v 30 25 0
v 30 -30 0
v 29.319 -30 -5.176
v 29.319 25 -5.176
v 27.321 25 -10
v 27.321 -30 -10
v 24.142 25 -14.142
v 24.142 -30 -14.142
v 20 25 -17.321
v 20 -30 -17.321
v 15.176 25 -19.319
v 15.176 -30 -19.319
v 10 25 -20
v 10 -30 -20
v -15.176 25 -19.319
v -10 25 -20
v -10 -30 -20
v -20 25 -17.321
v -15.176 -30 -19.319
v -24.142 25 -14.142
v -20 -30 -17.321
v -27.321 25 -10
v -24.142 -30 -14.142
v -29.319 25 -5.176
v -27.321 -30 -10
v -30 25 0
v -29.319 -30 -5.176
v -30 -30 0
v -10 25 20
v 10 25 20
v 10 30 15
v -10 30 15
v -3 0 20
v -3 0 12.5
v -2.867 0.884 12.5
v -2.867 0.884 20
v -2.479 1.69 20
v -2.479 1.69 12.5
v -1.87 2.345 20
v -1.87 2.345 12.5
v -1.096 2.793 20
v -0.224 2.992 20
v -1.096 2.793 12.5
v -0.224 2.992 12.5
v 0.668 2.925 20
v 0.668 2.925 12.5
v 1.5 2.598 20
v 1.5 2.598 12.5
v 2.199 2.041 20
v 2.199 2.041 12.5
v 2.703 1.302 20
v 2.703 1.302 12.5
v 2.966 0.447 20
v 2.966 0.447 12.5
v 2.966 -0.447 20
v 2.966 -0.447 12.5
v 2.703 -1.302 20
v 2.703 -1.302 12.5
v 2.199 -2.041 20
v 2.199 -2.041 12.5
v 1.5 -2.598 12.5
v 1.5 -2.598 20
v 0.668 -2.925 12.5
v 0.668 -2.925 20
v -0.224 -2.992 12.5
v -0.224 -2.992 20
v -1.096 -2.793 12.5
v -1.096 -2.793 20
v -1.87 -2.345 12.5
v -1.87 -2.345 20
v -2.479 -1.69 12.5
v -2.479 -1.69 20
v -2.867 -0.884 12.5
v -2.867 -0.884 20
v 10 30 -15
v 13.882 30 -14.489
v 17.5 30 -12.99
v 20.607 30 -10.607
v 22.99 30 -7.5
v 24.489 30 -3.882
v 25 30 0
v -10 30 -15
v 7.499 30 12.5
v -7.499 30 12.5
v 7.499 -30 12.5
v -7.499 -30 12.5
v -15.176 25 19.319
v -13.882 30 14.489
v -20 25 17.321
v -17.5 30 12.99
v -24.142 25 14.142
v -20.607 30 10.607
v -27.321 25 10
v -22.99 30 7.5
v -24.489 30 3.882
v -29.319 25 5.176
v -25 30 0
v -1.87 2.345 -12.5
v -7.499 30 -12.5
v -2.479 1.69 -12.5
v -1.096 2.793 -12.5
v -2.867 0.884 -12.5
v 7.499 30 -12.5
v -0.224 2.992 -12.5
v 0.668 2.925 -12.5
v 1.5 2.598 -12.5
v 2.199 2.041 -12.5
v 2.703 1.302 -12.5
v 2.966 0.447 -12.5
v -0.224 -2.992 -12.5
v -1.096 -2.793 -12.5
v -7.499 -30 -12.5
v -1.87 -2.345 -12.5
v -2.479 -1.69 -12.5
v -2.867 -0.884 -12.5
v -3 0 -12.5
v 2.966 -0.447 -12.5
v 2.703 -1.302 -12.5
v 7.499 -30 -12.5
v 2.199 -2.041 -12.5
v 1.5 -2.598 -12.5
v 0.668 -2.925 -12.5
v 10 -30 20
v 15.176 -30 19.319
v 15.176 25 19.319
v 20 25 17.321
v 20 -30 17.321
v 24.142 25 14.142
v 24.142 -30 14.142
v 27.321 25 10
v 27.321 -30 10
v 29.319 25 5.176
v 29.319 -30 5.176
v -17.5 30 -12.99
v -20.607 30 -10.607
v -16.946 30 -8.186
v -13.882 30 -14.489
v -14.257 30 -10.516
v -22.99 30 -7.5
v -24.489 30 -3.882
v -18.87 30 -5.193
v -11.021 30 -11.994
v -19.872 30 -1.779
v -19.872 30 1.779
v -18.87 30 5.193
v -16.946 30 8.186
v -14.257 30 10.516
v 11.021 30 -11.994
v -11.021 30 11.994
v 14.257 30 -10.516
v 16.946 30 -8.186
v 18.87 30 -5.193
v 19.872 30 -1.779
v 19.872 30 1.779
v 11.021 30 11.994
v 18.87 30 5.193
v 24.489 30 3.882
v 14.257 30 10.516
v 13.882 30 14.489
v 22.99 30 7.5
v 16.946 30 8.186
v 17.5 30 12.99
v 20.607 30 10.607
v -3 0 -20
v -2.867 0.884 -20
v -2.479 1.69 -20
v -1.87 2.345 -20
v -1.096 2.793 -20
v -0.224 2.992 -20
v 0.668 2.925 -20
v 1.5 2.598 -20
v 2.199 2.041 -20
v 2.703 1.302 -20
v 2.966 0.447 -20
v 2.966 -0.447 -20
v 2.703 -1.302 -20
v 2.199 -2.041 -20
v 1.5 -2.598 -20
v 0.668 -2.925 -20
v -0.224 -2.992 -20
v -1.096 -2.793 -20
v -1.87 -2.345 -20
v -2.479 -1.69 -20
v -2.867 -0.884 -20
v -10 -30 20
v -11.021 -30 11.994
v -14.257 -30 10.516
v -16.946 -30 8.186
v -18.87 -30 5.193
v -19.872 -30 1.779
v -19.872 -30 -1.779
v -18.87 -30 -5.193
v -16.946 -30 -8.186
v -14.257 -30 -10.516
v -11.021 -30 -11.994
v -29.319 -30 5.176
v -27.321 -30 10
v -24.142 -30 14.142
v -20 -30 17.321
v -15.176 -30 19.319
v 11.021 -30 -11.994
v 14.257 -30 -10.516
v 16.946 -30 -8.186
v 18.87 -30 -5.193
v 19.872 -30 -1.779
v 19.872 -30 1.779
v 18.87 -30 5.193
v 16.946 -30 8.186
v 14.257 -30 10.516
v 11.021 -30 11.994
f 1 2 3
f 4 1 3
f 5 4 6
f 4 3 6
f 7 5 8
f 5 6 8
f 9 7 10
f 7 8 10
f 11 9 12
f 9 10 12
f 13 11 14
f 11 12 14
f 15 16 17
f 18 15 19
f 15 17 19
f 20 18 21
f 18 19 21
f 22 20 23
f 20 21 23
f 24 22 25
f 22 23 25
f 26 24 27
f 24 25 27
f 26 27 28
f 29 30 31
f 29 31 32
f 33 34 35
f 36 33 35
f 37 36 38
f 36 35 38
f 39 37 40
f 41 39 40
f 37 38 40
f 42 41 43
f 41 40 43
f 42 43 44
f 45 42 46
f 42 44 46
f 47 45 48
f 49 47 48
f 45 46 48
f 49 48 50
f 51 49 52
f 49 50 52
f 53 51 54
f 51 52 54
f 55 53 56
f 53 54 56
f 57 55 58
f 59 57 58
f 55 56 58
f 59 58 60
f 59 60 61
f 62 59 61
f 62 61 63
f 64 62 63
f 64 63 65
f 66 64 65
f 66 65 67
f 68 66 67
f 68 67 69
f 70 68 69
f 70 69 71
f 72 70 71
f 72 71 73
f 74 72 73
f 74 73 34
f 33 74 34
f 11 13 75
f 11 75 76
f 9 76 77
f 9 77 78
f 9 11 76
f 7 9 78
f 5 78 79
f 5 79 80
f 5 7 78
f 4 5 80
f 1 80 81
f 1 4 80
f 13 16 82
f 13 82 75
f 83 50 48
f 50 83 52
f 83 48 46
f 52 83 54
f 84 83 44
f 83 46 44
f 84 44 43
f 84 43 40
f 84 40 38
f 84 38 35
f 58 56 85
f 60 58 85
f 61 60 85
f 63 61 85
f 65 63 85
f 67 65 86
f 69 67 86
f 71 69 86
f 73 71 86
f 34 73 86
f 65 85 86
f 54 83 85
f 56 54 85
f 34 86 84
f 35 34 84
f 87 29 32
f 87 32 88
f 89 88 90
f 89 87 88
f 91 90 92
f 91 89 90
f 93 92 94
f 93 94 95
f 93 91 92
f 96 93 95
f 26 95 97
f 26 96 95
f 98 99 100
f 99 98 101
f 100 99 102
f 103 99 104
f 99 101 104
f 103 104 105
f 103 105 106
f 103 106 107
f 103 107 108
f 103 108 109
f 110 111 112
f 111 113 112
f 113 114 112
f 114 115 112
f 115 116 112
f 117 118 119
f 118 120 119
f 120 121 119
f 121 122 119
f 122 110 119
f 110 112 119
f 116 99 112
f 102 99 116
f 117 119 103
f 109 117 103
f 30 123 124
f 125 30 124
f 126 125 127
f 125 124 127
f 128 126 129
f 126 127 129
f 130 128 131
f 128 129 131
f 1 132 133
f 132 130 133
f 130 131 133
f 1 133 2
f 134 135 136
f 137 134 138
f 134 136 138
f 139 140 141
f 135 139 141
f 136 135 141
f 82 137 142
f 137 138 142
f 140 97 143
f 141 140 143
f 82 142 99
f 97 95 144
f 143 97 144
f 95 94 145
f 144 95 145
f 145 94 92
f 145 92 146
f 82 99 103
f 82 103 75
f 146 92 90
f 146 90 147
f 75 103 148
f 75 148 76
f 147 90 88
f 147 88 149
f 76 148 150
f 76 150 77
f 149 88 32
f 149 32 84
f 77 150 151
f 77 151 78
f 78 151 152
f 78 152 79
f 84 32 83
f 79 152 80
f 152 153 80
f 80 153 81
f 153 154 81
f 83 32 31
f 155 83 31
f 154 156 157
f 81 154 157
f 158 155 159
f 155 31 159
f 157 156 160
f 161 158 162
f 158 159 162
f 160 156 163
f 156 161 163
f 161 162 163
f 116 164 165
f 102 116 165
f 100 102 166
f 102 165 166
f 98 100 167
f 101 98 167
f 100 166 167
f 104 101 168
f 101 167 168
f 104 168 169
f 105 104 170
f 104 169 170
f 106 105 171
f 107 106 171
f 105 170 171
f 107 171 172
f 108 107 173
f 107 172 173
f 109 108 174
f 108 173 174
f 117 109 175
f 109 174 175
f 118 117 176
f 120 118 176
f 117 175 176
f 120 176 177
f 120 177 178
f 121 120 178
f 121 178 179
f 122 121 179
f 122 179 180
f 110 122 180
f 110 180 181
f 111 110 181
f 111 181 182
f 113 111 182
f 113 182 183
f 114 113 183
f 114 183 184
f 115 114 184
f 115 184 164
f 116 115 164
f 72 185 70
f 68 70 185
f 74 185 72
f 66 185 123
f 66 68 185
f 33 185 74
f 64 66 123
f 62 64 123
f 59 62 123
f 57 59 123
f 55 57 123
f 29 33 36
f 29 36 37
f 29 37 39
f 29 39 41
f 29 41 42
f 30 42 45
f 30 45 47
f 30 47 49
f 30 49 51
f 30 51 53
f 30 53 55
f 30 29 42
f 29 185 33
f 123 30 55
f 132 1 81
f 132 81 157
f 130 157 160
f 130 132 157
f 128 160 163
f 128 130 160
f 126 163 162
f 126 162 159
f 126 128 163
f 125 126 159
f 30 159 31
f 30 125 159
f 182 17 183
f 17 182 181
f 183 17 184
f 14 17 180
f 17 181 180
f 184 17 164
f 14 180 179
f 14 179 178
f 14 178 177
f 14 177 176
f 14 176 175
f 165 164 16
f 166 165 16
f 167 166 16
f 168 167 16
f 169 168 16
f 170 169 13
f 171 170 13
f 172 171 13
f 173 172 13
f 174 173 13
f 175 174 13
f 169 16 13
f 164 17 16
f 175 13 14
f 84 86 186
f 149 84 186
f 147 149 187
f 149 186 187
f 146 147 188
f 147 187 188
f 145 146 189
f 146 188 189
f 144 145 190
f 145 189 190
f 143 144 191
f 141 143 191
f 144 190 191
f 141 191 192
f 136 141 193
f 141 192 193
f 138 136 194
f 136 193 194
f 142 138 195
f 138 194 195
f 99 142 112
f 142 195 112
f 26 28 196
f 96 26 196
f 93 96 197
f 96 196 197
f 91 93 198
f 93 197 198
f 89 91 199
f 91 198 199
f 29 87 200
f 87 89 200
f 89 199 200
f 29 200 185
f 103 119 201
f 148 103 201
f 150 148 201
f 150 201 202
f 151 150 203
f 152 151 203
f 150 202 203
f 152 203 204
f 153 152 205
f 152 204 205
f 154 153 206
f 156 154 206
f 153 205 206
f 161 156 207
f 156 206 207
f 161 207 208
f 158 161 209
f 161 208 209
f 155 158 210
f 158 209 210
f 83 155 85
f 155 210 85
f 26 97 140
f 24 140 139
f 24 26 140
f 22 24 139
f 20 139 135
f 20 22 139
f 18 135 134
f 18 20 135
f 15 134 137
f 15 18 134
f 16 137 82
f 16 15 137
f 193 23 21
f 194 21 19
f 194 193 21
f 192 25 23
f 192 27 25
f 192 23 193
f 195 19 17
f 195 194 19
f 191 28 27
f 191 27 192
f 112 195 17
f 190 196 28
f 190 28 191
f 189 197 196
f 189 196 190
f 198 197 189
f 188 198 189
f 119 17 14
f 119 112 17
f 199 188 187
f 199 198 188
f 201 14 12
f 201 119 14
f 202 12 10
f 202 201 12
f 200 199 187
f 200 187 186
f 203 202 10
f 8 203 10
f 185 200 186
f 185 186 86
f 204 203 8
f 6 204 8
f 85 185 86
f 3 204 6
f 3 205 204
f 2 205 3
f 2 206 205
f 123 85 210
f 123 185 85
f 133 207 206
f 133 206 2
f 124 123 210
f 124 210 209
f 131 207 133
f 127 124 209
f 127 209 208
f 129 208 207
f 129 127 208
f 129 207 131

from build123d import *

# Parameters (mm, degrees)
SKETCH1_W           = 60
SKETCH1_H           = 60
BOSS_EXTRUDE1_DEPTH = 20
CUT_EXTRUDE1_DEPTH  = 60
CHAMFER1_SIZE       = 5
SKETCH6_R           = 3
CUT_EXTRUDE2_DEPTH  = 59.309518948
SKETCH9_R           = 12.5
CUT_EXTRUDE4_DEPTH  = 71


with BuildPart() as part:
    # Sketch1 → Boss-Extrude1 (new, symmetric)
    with BuildSketch(Plane.XY):
        Rectangle(SKETCH1_W, SKETCH1_H)
    extrude(amount=BOSS_EXTRUDE1_DEPTH, both=True)

    # Sketch5 → Cut-Extrude1 (cut)
    with BuildSketch(Plane.XZ.offset(30)):
        with BuildLine():
            ThreePointArc((30, 0), (24.142135624, -14.142135624), (10, -20))
            Line((10, -20), (30, -20))
            Line((30, -20), (30, 0))
        make_face()
        with BuildLine():
            Line((30, 20), (10.000000023, 20))
            ThreePointArc((10.000000023, 20), (24.142135632, 14.142135615), (30, 0))
            Line((30, 0), (30, 20))
        make_face()
        with BuildLine():
            ThreePointArc((-30, -1.4e-08), (-24.142135621, 14.142135627), (-9.999999977, 20))
            Line((-9.999999977, 20), (-30, 20))
            Line((-30, 20), (-30, -1.4e-08))
        make_face()
        with BuildLine():
            Line((-30, -20), (-10, -20))
            ThreePointArc((-10, -20), (-24.142135619, -14.142135629), (-30, -1.4e-08))
            Line((-30, -1.4e-08), (-30, -20))
        make_face()
    extrude(amount=-CUT_EXTRUDE1_DEPTH, mode=Mode.SUBTRACT)

    # Chamfer1
    chamfer1_edges = [part.edges().sort_by_distance(p)[0] for p in [
        (0, 30, -20),
        (30, 30, -1.2e-08),
        (-30, 30, 1.2e-08),
        (2.3e-08, 30, 20),
    ]]
    chamfer(chamfer1_edges, length=CHAMFER1_SIZE)

    # Sketch6 → Cut-Extrude2 (cut, through all)
    with BuildSketch(Plane(origin=(0, 0, -20), x_dir=(-1, 0, 0), z_dir=(0, 0, -1))):
        Circle(SKETCH6_R)
    extrude(amount=-CUT_EXTRUDE2_DEPTH, mode=Mode.SUBTRACT)

    # Sketch9 → Cut-Extrude4 (cut, through all)
    with BuildSketch(Plane.XZ.offset(30)):
        with Locations((-7.499382611, 0)):
            Circle(SKETCH9_R)
        with Locations((7.499382611, 0)):
            Circle(SKETCH9_R)
        with BuildLine():
            ThreePointArc((0, 10.000463012), (3.546901596, 11.858663239), (7.499382611, 12.5))
            Line((7.499382611, 12.5), (-7.499382623, 12.5))
            ThreePointArc((-7.499382623, 12.5), (-3.546901601, 11.858663241), (0, 10.000463012))
        make_face()
        with BuildLine():
            Line((-7.499382656, -12.5), (7.499382577, -12.5))
            ThreePointArc((7.499382577, -12.5), (3.54690158, -11.858663234), (0, -10.000463012))
            ThreePointArc((0, -10.000463012), (-3.546901617, -11.858663246), (-7.499382656, -12.5))
        make_face()
    extrude(amount=-CUT_EXTRUDE4_DEPTH, mode=Mode.SUBTRACT)


solid = part.part
